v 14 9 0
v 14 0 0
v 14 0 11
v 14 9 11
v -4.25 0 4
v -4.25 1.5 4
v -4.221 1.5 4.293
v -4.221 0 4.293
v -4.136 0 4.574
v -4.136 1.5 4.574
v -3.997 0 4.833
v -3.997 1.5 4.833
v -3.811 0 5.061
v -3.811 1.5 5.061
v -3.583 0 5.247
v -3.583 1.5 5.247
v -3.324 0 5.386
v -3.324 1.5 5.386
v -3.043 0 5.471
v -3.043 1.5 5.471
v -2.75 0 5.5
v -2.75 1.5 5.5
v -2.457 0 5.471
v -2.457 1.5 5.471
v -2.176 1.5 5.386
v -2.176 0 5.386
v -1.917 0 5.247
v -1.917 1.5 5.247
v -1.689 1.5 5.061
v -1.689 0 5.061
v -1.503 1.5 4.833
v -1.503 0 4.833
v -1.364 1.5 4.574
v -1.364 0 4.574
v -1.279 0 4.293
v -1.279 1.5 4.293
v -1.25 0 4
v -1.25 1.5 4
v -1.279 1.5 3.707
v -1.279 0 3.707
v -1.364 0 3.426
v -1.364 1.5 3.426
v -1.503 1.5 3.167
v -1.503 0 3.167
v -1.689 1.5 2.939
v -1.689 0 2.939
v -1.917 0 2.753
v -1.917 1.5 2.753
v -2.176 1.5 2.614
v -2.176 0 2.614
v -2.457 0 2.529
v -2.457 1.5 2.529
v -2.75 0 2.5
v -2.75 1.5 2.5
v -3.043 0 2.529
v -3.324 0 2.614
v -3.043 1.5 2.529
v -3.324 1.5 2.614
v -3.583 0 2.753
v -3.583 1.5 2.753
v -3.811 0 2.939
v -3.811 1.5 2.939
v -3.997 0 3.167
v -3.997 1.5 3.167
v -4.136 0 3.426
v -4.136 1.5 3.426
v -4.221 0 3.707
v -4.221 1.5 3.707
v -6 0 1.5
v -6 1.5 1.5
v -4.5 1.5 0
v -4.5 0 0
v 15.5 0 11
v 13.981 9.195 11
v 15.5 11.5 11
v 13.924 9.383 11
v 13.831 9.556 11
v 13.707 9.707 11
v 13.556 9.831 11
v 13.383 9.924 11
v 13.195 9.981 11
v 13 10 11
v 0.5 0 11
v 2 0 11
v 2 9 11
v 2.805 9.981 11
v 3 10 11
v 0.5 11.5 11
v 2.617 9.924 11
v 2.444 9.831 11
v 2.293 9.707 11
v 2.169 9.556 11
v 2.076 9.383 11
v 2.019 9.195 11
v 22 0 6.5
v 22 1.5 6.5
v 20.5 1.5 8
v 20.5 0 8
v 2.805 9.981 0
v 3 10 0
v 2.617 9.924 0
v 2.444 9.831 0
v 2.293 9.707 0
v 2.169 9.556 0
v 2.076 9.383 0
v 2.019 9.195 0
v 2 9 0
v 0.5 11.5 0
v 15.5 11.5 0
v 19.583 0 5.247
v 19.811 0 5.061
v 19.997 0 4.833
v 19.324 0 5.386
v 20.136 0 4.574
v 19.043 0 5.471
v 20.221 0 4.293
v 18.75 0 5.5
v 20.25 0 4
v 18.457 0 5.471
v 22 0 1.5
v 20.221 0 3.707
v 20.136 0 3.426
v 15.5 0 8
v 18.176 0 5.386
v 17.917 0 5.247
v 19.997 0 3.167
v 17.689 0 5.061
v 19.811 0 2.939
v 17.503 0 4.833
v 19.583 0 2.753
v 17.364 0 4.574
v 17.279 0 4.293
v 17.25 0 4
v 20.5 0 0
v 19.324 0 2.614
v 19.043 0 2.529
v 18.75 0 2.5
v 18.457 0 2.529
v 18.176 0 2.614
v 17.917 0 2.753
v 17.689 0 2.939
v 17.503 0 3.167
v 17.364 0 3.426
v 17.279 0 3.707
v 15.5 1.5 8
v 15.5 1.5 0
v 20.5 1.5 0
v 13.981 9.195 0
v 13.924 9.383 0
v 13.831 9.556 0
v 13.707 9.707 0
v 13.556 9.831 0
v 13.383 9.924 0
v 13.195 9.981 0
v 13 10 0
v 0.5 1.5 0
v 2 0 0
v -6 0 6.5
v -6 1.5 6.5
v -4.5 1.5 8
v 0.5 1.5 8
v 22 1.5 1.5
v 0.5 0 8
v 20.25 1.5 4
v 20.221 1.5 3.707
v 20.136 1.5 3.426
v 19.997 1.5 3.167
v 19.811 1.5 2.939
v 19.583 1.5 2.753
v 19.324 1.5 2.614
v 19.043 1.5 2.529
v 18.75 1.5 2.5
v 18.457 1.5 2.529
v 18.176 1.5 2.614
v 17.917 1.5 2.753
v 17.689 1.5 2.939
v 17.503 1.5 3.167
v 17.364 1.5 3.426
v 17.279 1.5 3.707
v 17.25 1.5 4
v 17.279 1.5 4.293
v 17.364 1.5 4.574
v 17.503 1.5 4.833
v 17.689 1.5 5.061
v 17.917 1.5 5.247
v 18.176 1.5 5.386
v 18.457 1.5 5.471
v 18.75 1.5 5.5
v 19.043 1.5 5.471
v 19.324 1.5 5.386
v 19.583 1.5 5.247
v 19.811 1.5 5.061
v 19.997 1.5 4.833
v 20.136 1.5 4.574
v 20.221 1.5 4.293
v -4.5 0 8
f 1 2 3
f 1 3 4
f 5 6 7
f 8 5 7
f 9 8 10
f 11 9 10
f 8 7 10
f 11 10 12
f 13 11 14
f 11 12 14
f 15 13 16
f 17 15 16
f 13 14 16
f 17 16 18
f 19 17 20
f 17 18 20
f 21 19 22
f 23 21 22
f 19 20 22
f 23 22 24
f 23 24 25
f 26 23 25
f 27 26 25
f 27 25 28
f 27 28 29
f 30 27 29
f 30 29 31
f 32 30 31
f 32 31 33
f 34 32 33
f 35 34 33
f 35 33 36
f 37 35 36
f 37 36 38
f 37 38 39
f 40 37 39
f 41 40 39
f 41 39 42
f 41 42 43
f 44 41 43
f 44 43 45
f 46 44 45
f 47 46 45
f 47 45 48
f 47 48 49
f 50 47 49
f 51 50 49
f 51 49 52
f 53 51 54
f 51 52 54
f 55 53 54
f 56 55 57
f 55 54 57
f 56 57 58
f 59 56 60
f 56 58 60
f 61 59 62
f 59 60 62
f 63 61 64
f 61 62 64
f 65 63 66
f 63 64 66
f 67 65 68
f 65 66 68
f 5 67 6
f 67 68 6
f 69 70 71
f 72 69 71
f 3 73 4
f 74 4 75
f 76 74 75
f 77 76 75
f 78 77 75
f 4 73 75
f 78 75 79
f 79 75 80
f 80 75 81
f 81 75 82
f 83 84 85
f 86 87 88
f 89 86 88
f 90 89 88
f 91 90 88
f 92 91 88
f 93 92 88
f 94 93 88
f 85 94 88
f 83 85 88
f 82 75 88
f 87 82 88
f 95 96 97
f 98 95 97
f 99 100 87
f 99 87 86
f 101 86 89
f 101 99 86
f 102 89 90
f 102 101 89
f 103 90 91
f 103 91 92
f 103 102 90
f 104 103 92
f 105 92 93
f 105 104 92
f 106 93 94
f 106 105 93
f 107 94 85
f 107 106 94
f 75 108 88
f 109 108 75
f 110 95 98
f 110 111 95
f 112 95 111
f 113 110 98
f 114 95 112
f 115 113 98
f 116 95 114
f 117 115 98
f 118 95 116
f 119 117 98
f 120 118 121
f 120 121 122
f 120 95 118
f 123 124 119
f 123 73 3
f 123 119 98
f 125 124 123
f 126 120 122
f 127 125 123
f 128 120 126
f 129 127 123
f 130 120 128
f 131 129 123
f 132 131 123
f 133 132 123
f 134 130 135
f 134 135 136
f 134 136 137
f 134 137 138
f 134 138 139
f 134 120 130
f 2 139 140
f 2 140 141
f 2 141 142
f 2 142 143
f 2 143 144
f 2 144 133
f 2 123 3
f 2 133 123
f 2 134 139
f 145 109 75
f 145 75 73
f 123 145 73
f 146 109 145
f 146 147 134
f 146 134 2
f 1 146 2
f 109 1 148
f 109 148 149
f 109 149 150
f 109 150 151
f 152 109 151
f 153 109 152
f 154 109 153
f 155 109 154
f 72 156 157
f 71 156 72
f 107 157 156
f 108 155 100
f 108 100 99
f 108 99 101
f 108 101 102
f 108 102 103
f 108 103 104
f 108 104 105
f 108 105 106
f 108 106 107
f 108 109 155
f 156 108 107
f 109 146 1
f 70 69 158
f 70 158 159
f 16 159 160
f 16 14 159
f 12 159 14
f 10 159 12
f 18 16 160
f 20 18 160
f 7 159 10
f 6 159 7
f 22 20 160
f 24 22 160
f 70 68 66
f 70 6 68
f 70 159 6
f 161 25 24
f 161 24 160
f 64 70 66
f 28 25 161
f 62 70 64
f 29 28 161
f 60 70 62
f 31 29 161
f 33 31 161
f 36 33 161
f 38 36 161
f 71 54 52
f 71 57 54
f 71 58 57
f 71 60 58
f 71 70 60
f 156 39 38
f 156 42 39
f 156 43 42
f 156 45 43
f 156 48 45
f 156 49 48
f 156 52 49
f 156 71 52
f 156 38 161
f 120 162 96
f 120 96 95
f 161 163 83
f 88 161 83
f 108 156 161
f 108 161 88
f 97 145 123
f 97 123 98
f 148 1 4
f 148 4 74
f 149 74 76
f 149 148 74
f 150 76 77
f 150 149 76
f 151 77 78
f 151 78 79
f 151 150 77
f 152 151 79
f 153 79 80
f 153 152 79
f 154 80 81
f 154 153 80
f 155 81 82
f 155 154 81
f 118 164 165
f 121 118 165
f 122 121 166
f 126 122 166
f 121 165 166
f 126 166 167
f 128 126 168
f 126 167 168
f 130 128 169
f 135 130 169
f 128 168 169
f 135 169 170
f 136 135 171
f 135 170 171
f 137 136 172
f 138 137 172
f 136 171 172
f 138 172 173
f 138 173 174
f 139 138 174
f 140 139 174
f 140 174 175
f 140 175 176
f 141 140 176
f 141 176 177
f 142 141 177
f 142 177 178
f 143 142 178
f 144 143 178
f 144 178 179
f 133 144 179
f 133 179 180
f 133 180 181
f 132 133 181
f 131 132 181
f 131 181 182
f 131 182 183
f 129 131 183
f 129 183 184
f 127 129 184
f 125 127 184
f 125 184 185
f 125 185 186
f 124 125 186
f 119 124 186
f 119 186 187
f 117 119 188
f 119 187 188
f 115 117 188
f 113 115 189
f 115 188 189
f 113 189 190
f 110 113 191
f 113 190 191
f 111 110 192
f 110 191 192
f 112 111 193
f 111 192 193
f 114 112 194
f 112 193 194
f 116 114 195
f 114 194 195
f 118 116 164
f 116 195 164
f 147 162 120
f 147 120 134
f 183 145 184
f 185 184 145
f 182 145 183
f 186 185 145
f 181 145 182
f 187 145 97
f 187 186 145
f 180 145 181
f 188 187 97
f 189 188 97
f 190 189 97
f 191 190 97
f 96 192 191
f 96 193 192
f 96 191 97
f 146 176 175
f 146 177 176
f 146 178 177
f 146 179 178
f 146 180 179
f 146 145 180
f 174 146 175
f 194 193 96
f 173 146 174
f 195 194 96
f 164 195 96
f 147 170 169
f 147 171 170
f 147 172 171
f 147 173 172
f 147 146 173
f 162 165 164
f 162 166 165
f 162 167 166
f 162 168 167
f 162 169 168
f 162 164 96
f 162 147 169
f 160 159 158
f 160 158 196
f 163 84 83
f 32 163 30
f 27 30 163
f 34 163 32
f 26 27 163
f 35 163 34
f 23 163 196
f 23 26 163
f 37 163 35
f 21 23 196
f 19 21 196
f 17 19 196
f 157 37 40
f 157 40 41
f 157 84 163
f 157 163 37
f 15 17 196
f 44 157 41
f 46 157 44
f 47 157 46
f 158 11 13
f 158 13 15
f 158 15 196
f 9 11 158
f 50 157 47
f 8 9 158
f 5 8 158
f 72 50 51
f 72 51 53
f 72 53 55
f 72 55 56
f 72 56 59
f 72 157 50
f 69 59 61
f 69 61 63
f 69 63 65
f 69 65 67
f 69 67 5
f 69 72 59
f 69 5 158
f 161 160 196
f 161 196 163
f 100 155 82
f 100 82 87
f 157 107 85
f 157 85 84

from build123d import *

# Parameters (mm, degrees)
BOSS_EXTRUDE1_DEPTH = 11
SKETCH3_W           = 6.5
SKETCH3_H           = 1.5
CUT_EXTRUDE5_DEPTH  = 3
SKETCH6_R           = 1.5
CUT_EXTRUDE7_DEPTH  = 27.551836095


with BuildPart() as part:
    # Sketch1 → Boss-Extrude1 (new body)
    with BuildSketch(Plane.XY):
        with BuildLine():
            Line((0.5, 1.5), (0.5, 11.5))
            Line((0.5, 11.5), (15.5, 11.5))
            Line((15.5, 11.5), (15.5, 1.5))
            Line((15.5, 1.5), (22, 1.5))
            Line((22, 1.5), (22, 0))
            Line((22, 0), (14, 0))
            Line((14, 0), (14, 9))
            ThreePointArc((14, 9), (13.707106781, 9.707106781), (13, 10))
            Line((13, 10), (3, 10))
            ThreePointArc((3, 10), (2.292893219, 9.707106781), (2, 9))
            Line((2, 9), (2, 0))
            Line((2, 0), (-6, 0))
            Line((-6, 0), (-6, 1.5))
            Line((-6, 1.5), (0.5, 1.5))
        make_face()
    extrude(amount=BOSS_EXTRUDE1_DEPTH)

    # Sketch3 → Cut-Extrude5 (cut)
    with BuildSketch(Plane.XY.offset(11)):
        with Locations((-2.75, 0.75)):
            Rectangle(SKETCH3_W, SKETCH3_H)
        with Locations((18.75, 0.75)):
            Rectangle(SKETCH3_W, SKETCH3_H)
    extrude(amount=-CUT_EXTRUDE5_DEPTH, mode=Mode.SUBTRACT)

    # Sketch6 → Cut-Extrude7 (cut, through all)
    with BuildSketch(Plane(origin=(0, 1.5, 0), x_dir=(1, 0, 0), z_dir=(0, 1, 0))):
        with Locations(Location((-2.75, -4, 0), (0, 0, 180))):
            Circle(SKETCH6_R)
        with Locations((18.75, -4)):
            Circle(SKETCH6_R)
        Polygon((-6, -1.5), (-4.5, 0), (-6, 0), align=None)
        Polygon((20.5, 0), (22, 0), (22, -1.5), align=None)
        Polygon((22, -6.5), (20.5, -8), (22, -8), align=None)
        Polygon((-4.5, -8), (-6, -8), (-6, -6.5), align=None)
    extrude(amount=-CUT_EXTRUDE7_DEPTH, mode=Mode.SUBTRACT)


solid = part.part
